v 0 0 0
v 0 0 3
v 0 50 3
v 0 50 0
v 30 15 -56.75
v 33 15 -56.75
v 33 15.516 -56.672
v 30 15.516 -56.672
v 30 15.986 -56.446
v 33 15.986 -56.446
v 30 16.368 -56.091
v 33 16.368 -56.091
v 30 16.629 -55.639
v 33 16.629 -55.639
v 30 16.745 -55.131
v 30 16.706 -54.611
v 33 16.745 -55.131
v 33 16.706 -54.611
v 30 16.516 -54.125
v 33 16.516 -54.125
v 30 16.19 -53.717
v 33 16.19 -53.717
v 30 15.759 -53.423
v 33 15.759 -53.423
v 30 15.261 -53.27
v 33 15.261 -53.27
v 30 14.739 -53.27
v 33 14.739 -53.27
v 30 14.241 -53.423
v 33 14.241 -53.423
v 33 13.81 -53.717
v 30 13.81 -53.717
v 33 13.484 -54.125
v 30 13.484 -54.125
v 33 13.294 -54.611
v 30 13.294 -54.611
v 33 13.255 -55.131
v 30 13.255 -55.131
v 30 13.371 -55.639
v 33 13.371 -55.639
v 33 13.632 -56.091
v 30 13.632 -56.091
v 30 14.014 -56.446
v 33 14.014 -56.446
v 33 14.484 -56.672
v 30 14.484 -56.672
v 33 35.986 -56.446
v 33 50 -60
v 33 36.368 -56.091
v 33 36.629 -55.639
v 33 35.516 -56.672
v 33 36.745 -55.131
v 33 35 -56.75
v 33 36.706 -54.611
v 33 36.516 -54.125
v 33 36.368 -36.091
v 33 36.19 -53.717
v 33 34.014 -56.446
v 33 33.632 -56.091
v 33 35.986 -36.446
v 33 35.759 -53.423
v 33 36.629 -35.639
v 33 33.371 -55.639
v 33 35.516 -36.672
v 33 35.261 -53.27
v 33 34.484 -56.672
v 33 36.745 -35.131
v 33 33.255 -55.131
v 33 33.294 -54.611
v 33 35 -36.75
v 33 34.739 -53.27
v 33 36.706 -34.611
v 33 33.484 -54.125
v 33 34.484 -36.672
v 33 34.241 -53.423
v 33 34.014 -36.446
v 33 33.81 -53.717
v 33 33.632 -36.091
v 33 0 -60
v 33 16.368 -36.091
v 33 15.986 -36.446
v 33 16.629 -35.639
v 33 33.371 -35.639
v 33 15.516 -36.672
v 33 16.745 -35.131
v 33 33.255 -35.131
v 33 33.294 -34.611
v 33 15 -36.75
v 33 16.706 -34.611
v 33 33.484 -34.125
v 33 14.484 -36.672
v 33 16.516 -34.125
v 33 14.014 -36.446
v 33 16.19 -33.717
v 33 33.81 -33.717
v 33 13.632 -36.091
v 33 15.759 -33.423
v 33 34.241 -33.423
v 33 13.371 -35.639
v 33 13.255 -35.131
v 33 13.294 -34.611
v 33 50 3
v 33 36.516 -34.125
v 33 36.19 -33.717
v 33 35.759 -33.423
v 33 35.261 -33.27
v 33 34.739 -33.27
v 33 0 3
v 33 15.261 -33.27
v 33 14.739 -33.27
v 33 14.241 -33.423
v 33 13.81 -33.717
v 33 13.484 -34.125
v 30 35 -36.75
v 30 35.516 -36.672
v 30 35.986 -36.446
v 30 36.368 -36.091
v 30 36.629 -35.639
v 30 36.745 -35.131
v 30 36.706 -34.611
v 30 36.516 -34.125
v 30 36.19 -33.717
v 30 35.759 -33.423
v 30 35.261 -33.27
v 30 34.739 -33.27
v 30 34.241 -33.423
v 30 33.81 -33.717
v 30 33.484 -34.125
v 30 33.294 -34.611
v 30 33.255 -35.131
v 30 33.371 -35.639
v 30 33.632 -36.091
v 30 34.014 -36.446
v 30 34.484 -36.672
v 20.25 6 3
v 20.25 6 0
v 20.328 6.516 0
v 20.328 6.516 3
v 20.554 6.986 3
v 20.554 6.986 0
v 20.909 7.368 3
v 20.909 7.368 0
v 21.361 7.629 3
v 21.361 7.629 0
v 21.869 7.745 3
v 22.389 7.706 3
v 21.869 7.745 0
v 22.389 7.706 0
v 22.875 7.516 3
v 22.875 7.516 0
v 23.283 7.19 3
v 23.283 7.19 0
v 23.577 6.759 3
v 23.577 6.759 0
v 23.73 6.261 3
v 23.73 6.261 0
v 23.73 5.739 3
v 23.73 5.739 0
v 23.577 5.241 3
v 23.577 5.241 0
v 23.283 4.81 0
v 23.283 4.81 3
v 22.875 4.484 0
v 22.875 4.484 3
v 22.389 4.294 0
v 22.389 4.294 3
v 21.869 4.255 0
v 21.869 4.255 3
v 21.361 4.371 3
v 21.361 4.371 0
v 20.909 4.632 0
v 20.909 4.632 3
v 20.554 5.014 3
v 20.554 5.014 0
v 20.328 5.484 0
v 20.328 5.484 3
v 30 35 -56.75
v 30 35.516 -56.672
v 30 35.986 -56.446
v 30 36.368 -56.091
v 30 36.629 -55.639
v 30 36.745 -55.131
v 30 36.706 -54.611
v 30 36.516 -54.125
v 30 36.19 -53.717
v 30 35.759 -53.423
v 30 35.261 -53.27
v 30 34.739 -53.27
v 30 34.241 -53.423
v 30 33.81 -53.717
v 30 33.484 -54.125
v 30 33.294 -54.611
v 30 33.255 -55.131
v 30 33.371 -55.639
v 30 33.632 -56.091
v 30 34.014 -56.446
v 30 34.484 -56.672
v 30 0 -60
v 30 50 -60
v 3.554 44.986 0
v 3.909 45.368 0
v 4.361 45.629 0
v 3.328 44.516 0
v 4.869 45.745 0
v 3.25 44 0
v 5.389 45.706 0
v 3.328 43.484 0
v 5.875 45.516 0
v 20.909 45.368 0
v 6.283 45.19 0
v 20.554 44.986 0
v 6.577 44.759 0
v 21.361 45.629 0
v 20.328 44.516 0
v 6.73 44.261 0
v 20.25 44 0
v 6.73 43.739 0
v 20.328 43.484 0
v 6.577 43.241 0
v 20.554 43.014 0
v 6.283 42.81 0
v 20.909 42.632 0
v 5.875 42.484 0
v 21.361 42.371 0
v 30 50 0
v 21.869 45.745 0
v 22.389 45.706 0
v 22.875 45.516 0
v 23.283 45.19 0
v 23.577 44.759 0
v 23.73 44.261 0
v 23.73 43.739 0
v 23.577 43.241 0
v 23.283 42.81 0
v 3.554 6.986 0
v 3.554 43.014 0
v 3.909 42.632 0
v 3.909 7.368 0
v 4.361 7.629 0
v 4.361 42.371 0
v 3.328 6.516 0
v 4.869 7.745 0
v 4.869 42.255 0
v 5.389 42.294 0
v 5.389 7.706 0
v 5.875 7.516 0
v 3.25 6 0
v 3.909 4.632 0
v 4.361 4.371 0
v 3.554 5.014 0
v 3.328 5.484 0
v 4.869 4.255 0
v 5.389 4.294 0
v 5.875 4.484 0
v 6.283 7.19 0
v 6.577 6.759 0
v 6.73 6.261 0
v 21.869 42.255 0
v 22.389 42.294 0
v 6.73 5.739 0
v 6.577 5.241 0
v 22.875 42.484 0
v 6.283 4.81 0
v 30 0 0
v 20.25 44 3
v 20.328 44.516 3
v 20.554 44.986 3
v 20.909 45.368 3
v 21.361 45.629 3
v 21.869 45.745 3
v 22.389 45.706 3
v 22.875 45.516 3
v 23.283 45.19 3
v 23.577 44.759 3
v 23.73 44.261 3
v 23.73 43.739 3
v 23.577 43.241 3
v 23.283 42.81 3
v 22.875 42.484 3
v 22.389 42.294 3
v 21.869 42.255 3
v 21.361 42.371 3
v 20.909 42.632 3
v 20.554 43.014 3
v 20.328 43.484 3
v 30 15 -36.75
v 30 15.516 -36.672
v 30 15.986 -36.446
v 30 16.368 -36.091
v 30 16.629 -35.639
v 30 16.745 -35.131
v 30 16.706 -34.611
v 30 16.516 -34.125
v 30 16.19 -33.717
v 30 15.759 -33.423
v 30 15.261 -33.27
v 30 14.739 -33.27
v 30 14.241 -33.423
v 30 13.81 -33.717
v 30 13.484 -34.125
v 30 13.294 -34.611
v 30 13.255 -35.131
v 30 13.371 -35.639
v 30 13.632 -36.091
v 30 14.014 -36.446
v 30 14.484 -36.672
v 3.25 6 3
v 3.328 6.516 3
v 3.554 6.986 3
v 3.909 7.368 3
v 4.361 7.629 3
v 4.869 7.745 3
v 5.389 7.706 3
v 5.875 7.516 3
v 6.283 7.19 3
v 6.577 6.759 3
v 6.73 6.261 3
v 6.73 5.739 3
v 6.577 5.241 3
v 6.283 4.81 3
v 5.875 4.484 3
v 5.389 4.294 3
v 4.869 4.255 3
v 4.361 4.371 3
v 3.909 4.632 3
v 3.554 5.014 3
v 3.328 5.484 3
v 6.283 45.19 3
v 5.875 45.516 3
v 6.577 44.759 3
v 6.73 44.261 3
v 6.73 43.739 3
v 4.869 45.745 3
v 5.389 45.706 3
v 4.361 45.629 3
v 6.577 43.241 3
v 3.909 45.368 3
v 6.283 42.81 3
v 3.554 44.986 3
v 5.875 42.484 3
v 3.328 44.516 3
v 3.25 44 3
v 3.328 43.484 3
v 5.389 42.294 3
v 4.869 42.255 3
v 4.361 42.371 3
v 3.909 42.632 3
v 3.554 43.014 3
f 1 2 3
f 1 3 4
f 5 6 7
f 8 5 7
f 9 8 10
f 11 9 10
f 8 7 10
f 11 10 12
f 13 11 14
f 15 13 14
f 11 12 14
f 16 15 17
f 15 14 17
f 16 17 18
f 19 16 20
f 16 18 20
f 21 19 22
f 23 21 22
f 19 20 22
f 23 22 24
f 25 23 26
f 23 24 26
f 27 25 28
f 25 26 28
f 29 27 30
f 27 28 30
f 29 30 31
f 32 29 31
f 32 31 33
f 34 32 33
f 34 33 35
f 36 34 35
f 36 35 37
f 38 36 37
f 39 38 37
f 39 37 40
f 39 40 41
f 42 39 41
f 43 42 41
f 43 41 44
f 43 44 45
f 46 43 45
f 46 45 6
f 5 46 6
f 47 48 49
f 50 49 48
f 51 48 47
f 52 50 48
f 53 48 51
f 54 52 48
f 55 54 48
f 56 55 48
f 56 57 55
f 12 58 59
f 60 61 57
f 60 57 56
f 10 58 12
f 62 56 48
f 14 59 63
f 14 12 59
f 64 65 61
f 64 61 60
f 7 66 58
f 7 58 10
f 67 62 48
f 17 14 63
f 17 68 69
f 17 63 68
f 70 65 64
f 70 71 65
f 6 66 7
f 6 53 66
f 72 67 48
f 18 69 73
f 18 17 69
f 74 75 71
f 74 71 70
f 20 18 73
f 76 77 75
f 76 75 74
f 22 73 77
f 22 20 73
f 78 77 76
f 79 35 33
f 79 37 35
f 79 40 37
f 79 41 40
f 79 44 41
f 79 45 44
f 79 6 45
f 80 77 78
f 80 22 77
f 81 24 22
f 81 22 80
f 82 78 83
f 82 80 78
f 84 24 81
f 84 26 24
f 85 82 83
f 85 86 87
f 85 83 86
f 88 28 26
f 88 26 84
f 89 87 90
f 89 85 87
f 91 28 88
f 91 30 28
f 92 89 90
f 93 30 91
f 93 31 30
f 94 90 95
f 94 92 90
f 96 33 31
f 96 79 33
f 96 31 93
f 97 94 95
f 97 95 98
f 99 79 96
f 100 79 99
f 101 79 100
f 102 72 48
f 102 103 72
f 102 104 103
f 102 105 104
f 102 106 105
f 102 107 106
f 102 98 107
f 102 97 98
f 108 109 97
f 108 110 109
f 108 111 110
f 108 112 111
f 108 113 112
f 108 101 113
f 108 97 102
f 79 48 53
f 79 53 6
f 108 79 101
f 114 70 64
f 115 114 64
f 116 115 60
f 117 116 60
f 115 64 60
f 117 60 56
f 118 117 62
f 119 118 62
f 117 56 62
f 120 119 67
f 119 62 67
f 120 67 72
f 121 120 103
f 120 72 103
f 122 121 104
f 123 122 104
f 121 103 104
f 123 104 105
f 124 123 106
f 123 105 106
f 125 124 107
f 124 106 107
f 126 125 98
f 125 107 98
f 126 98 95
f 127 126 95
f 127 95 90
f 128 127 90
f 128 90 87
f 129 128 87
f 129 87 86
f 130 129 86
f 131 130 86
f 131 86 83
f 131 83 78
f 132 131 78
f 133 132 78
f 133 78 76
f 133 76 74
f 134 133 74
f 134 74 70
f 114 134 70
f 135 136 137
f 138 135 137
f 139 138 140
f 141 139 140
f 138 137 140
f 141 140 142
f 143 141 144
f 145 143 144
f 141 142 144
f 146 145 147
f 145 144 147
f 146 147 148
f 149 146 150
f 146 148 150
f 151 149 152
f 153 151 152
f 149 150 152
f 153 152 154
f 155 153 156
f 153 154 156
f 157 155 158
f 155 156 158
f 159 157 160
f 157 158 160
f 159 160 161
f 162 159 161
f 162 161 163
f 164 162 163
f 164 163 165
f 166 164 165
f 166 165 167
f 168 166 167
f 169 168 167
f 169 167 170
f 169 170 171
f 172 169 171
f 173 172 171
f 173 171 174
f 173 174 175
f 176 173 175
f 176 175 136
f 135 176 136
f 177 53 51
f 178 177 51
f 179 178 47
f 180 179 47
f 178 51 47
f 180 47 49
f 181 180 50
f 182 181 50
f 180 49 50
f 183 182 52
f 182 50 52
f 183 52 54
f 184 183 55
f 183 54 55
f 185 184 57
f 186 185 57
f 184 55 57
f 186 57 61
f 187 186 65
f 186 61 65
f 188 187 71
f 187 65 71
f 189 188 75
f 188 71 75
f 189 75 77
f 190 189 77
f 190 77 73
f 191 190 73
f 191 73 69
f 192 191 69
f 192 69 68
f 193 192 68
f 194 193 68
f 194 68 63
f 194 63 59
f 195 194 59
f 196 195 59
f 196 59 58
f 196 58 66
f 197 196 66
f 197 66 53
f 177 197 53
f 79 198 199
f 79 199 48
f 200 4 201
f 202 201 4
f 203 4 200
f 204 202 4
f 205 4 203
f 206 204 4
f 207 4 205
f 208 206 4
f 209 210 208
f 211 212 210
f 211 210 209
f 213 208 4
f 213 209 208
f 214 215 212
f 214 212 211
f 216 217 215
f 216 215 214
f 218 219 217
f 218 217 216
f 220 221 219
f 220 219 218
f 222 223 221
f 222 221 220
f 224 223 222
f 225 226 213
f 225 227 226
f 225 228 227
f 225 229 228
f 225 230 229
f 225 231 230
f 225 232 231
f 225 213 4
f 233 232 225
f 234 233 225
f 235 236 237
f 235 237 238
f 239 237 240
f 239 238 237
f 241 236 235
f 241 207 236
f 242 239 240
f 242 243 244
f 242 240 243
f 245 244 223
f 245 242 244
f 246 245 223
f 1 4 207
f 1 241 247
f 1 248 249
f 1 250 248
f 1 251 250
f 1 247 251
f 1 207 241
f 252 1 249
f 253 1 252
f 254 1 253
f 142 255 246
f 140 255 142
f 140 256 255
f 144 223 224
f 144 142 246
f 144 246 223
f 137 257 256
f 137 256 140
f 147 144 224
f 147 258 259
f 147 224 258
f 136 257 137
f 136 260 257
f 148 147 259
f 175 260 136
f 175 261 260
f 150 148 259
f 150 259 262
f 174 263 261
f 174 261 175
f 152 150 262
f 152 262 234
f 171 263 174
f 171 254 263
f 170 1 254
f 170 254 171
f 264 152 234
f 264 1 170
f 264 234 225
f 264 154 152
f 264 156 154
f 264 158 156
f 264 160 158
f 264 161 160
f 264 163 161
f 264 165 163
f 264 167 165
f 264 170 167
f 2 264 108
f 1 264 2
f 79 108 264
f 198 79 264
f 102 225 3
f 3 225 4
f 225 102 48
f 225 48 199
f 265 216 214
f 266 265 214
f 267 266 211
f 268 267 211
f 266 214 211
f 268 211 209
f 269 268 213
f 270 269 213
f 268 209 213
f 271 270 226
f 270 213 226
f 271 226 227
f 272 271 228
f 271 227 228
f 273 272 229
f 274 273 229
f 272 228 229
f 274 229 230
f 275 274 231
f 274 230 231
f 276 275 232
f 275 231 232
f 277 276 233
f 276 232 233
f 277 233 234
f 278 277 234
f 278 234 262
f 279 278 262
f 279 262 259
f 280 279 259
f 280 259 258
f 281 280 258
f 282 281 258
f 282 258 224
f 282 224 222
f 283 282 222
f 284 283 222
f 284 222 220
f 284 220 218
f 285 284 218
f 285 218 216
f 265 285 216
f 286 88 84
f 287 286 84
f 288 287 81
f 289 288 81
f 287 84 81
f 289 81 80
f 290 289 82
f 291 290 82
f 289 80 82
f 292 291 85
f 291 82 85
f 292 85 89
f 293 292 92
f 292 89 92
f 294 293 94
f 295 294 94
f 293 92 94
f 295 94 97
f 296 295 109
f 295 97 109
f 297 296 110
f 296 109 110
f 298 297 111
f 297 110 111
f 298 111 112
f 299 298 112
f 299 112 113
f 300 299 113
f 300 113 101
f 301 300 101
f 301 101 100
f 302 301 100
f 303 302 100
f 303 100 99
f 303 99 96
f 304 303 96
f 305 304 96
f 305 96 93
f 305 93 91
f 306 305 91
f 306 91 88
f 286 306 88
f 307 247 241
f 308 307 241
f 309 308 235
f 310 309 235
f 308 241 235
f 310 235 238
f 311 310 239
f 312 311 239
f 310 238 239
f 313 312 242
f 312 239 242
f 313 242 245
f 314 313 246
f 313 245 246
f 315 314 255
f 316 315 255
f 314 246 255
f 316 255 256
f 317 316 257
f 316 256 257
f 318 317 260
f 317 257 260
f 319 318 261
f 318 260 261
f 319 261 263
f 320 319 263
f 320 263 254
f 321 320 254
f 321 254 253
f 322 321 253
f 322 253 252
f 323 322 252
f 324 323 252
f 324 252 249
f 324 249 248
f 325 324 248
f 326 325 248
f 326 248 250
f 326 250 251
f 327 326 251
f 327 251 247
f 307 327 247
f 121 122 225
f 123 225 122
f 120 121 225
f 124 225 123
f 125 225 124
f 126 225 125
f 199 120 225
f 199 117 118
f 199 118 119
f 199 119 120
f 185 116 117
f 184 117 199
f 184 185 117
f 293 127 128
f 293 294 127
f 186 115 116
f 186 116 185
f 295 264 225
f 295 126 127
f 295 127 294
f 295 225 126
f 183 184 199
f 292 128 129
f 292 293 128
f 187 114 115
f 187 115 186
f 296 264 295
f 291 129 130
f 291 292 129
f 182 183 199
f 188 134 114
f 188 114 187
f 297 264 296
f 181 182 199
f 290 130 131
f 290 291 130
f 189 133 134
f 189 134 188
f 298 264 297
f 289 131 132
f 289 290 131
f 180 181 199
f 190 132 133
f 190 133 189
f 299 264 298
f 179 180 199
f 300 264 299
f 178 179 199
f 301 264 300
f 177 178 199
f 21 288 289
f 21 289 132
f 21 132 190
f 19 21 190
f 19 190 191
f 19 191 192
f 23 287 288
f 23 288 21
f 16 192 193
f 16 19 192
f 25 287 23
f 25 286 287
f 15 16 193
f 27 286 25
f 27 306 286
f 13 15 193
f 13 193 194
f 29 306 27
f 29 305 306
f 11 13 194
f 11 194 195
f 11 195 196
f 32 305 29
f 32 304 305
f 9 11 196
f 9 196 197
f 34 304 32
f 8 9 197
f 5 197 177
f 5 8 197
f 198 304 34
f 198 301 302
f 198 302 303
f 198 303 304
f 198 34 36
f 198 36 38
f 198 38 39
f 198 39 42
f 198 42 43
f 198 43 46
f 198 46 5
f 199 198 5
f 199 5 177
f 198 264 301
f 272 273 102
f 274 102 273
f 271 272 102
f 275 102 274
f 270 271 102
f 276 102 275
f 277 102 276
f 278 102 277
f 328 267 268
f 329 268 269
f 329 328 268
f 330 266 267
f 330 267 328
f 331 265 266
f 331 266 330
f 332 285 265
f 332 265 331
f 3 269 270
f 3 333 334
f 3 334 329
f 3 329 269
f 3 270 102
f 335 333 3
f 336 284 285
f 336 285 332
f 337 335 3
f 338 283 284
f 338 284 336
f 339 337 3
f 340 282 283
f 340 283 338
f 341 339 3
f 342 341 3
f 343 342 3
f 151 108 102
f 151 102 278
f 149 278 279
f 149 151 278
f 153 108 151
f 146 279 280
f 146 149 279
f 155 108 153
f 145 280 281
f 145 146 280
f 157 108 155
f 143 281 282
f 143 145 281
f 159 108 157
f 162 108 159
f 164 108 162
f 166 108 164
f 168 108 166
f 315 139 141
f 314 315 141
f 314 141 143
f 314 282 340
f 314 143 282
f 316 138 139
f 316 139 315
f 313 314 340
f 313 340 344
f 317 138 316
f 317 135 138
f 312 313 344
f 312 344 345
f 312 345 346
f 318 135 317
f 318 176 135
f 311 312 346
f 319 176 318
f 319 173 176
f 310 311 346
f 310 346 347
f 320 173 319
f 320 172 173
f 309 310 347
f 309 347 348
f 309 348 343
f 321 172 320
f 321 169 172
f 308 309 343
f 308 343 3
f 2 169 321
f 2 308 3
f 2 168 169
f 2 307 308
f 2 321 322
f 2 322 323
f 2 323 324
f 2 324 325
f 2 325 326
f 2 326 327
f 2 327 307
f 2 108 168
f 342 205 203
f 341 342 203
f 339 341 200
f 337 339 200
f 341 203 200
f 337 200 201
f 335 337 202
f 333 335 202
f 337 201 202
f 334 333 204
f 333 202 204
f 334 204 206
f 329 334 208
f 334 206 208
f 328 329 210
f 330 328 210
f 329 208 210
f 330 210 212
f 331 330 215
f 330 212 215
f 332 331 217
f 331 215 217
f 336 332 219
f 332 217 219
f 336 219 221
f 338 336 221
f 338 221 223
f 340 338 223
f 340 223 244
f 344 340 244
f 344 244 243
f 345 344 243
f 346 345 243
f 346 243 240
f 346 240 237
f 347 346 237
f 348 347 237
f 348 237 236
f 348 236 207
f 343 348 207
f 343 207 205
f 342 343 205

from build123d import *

# Parameters (mm, degrees)
EXTRUDE_1_DEPTH     = 50
SKETCH_2_R          = 1.75
CUT_EXTRUDE_1_DEPTH = 85.787970845
CUT_EXTRUDE_2_REACH = 86.788
SKETCH_3_R          = 1.75


with BuildPart() as part:
    # 草图1 → 凸台-拉伸1 (new body)
    with BuildSketch(Plane(origin=(0, 0, 0), x_dir=(1, 0, 0), z_dir=(0, 1, 0))):
        Polygon((0, 0), (30, 0), (30, 60), (33, 60), (33, -3), (0, -3), align=None)
    extrude(amount=EXTRUDE_1_DEPTH)

    # 草图2 → 切除-拉伸1 (cut, through all)
    with BuildSketch(Plane(origin=(0, 0, 0), x_dir=(-1, 0, 0), z_dir=(0, 0, -1))):
        with Locations((-22, 6)):
            Circle(SKETCH_2_R)
        with Locations((-22, 44)):
            Circle(SKETCH_2_R)
        with Locations((-5, 44)):
            Circle(SKETCH_2_R)
        with Locations((-5, 6)):
            Circle(SKETCH_2_R)
    extrude(amount=-CUT_EXTRUDE_1_DEPTH, mode=Mode.SUBTRACT)

    # 草图3 → 切除-拉伸2 (cut, up to next)
    with BuildSketch(Plane(origin=(33, 0, 0), x_dir=(0, 0, -1), z_dir=(1, 0, 0)), mode=Mode.PRIVATE) as cut_extrude_2_sk1:
        with Locations((55, 35)):
            Circle(SKETCH_3_R)
    cut_extrude_2_tool1 = extrude(cut_extrude_2_sk1.sketch, amount=-CUT_EXTRUDE_2_REACH, mode=Mode.PRIVATE) & part.part
    # 草图3 → 切除-拉伸2 (cut, up to next)
    with BuildSketch(Plane(origin=(33, 0, 0), x_dir=(0, 0, -1), z_dir=(1, 0, 0)), mode=Mode.PRIVATE) as cut_extrude_2_sk2:
        with Locations((55, 15)):
            Circle(SKETCH_3_R)
    cut_extrude_2_tool2 = extrude(cut_extrude_2_sk2.sketch, amount=-CUT_EXTRUDE_2_REACH, mode=Mode.PRIVATE) & part.part
    # 草图3 → 切除-拉伸2 (cut, up to next)
    with BuildSketch(Plane(origin=(33, 0, 0), x_dir=(0, 0, -1), z_dir=(1, 0, 0)), mode=Mode.PRIVATE) as cut_extrude_2_sk3:
        with Locations((35, 35)):
            Circle(SKETCH_3_R)
    cut_extrude_2_tool3 = extrude(cut_extrude_2_sk3.sketch, amount=-CUT_EXTRUDE_2_REACH, mode=Mode.PRIVATE) & part.part
    # 草图3 → 切除-拉伸2 (cut, up to next)
    with BuildSketch(Plane(origin=(33, 0, 0), x_dir=(0, 0, -1), z_dir=(1, 0, 0)), mode=Mode.PRIVATE) as cut_extrude_2_sk4:
        with Locations((35, 15)):
            Circle(SKETCH_3_R)
    cut_extrude_2_tool4 = extrude(cut_extrude_2_sk4.sketch, amount=-CUT_EXTRUDE_2_REACH, mode=Mode.PRIVATE) & part.part
    add(cut_extrude_2_tool1.solids().sort_by_distance((33, 35, -55))[0], mode=Mode.SUBTRACT)
    add(cut_extrude_2_tool2.solids().sort_by_distance((33, 15, -55))[0], mode=Mode.SUBTRACT)
    add(cut_extrude_2_tool3.solids().sort_by_distance((33, 35, -35))[0], mode=Mode.SUBTRACT)
    add(cut_extrude_2_tool4.solids().sort_by_distance((33, 15, -35))[0], mode=Mode.SUBTRACT)


solid = part.part
